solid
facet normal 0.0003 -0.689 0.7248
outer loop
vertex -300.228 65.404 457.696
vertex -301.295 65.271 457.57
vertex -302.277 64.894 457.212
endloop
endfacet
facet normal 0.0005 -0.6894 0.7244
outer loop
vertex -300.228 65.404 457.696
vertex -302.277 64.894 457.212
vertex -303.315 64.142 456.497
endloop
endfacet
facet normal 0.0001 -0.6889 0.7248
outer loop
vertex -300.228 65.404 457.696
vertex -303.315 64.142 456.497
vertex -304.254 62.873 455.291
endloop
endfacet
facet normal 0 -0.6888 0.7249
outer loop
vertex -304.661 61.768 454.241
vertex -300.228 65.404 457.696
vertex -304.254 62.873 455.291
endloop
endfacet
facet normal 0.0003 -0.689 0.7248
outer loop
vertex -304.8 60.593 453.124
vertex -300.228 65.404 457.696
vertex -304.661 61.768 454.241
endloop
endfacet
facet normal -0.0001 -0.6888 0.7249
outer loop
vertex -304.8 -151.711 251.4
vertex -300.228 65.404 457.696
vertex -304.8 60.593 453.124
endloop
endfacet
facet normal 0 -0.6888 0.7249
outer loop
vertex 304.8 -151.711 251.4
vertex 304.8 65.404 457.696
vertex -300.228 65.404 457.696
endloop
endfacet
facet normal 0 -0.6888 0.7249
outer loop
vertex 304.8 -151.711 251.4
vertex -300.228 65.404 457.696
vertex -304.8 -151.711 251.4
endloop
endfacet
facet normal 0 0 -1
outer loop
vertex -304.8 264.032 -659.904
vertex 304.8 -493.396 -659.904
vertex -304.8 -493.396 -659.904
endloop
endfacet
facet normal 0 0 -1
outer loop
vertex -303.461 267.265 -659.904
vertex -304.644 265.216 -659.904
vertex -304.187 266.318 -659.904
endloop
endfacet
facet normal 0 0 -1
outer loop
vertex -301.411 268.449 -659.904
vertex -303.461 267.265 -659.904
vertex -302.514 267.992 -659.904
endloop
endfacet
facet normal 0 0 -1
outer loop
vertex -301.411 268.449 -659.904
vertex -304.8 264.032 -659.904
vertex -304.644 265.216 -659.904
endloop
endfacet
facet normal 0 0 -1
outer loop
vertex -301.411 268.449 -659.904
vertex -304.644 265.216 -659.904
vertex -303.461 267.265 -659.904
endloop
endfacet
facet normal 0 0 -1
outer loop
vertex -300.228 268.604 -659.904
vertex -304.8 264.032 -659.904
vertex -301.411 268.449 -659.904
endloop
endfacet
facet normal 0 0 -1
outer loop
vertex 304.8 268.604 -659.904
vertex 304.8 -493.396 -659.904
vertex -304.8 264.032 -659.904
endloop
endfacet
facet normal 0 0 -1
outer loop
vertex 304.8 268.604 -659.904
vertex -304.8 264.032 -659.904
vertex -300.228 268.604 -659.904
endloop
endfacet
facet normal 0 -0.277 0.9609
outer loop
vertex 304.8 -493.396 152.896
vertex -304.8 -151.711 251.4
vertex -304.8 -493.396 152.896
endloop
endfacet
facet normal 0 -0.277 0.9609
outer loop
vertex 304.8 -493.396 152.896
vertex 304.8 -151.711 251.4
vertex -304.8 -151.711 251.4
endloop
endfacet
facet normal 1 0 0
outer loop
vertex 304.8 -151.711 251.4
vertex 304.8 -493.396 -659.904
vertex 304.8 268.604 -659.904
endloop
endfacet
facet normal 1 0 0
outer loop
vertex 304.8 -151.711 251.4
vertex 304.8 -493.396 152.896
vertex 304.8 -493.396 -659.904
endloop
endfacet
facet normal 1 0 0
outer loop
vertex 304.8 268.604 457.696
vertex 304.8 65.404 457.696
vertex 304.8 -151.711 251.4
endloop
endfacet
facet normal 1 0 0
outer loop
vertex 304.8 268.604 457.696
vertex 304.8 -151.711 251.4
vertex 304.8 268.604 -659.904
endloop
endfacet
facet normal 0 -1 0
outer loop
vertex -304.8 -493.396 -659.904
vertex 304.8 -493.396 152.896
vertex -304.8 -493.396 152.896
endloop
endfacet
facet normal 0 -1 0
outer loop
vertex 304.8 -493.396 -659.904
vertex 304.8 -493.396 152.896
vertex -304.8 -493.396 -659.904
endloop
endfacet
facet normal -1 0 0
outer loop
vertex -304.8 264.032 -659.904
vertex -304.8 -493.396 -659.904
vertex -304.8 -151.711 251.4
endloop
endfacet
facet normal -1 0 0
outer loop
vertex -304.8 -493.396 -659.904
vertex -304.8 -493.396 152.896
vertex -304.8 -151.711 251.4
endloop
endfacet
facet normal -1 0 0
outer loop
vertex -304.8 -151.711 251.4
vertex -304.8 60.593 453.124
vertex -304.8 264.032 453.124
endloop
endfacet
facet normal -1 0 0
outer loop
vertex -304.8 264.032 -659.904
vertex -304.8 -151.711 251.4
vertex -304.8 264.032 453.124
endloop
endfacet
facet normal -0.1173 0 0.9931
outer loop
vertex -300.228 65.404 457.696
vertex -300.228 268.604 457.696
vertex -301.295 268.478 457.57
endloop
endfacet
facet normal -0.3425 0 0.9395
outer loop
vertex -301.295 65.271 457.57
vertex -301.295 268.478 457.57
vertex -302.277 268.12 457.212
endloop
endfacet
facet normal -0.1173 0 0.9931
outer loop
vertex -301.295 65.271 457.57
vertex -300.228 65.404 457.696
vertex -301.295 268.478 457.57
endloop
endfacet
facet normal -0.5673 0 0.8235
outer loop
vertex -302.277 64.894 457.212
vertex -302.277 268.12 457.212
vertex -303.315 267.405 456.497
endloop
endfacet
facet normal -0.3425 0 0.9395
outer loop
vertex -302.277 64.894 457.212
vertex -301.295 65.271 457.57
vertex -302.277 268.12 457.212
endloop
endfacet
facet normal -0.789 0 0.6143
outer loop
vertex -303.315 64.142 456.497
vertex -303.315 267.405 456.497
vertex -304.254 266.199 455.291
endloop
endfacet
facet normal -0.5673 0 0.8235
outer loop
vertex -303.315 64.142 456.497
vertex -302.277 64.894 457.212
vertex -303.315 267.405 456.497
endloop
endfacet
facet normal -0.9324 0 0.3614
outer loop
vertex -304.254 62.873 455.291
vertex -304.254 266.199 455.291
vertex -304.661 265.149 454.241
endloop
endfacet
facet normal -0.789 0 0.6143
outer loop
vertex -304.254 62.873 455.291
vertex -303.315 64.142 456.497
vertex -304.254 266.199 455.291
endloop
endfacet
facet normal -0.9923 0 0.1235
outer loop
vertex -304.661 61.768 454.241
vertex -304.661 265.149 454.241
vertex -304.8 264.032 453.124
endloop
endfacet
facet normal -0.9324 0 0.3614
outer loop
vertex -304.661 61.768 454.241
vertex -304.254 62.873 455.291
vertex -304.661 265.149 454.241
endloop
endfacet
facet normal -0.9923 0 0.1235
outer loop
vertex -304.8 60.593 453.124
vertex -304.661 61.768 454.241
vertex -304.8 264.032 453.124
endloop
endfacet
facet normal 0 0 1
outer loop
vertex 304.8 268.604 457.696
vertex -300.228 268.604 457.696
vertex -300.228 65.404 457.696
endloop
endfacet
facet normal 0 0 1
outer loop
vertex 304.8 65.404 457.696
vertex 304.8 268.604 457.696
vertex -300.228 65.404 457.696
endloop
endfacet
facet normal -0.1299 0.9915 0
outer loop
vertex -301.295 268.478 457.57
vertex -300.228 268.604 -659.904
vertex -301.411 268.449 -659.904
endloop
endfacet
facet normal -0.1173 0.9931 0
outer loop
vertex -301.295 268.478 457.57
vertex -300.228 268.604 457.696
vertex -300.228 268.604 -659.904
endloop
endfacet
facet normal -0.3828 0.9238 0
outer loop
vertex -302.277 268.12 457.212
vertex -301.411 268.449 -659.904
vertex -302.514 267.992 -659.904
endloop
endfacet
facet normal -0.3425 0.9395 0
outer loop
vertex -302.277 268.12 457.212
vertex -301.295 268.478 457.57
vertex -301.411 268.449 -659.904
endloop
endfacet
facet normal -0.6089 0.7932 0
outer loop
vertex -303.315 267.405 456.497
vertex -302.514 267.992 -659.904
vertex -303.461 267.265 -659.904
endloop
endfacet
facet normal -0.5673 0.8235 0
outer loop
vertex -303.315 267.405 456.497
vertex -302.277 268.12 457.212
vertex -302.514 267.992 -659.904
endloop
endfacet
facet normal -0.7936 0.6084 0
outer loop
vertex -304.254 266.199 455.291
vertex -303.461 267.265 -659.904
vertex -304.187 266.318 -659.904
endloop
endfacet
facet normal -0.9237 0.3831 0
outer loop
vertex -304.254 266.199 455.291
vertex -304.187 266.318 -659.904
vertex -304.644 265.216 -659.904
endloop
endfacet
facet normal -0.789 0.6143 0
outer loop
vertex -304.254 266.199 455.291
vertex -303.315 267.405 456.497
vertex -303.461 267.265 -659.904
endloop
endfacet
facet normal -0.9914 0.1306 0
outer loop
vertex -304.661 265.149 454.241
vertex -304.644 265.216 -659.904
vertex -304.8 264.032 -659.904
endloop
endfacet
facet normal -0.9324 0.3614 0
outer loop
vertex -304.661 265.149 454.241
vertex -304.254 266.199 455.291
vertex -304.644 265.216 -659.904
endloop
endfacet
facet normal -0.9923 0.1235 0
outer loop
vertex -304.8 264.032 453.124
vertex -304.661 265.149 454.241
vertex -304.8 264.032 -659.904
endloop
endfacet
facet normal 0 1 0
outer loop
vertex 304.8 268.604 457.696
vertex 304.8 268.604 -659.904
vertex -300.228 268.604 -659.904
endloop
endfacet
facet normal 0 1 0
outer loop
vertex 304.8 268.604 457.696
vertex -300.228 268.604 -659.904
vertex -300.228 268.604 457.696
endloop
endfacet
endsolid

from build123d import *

# Parameters (mm, degrees)
F1_DEPTH = 304.8
F2_R     = 4.572


with BuildPart() as f1:
    # F0 (on Right) → F1 (new body, symmetric)
    with BuildSketch(Plane.YZ):
        Polygon((-493.39557, -659.903709), (268.60443, -659.903709), (268.60443, 457.696393), (65.40442, 457.696393), (-151.710834, 251.400065), (-493.39557, 152.896393), align=None)
    extrude(amount=F1_DEPTH, both=True)

    # F2
    f2_edges = [f1.edges().sort_by_distance(p)[0] for p in [
        (-304.8, 167.004425, 457.696393),
        (-304.8, 268.60443, -101.103658),
    ]]
    fillet(f2_edges, radius=F2_R)


solid = f1.part
